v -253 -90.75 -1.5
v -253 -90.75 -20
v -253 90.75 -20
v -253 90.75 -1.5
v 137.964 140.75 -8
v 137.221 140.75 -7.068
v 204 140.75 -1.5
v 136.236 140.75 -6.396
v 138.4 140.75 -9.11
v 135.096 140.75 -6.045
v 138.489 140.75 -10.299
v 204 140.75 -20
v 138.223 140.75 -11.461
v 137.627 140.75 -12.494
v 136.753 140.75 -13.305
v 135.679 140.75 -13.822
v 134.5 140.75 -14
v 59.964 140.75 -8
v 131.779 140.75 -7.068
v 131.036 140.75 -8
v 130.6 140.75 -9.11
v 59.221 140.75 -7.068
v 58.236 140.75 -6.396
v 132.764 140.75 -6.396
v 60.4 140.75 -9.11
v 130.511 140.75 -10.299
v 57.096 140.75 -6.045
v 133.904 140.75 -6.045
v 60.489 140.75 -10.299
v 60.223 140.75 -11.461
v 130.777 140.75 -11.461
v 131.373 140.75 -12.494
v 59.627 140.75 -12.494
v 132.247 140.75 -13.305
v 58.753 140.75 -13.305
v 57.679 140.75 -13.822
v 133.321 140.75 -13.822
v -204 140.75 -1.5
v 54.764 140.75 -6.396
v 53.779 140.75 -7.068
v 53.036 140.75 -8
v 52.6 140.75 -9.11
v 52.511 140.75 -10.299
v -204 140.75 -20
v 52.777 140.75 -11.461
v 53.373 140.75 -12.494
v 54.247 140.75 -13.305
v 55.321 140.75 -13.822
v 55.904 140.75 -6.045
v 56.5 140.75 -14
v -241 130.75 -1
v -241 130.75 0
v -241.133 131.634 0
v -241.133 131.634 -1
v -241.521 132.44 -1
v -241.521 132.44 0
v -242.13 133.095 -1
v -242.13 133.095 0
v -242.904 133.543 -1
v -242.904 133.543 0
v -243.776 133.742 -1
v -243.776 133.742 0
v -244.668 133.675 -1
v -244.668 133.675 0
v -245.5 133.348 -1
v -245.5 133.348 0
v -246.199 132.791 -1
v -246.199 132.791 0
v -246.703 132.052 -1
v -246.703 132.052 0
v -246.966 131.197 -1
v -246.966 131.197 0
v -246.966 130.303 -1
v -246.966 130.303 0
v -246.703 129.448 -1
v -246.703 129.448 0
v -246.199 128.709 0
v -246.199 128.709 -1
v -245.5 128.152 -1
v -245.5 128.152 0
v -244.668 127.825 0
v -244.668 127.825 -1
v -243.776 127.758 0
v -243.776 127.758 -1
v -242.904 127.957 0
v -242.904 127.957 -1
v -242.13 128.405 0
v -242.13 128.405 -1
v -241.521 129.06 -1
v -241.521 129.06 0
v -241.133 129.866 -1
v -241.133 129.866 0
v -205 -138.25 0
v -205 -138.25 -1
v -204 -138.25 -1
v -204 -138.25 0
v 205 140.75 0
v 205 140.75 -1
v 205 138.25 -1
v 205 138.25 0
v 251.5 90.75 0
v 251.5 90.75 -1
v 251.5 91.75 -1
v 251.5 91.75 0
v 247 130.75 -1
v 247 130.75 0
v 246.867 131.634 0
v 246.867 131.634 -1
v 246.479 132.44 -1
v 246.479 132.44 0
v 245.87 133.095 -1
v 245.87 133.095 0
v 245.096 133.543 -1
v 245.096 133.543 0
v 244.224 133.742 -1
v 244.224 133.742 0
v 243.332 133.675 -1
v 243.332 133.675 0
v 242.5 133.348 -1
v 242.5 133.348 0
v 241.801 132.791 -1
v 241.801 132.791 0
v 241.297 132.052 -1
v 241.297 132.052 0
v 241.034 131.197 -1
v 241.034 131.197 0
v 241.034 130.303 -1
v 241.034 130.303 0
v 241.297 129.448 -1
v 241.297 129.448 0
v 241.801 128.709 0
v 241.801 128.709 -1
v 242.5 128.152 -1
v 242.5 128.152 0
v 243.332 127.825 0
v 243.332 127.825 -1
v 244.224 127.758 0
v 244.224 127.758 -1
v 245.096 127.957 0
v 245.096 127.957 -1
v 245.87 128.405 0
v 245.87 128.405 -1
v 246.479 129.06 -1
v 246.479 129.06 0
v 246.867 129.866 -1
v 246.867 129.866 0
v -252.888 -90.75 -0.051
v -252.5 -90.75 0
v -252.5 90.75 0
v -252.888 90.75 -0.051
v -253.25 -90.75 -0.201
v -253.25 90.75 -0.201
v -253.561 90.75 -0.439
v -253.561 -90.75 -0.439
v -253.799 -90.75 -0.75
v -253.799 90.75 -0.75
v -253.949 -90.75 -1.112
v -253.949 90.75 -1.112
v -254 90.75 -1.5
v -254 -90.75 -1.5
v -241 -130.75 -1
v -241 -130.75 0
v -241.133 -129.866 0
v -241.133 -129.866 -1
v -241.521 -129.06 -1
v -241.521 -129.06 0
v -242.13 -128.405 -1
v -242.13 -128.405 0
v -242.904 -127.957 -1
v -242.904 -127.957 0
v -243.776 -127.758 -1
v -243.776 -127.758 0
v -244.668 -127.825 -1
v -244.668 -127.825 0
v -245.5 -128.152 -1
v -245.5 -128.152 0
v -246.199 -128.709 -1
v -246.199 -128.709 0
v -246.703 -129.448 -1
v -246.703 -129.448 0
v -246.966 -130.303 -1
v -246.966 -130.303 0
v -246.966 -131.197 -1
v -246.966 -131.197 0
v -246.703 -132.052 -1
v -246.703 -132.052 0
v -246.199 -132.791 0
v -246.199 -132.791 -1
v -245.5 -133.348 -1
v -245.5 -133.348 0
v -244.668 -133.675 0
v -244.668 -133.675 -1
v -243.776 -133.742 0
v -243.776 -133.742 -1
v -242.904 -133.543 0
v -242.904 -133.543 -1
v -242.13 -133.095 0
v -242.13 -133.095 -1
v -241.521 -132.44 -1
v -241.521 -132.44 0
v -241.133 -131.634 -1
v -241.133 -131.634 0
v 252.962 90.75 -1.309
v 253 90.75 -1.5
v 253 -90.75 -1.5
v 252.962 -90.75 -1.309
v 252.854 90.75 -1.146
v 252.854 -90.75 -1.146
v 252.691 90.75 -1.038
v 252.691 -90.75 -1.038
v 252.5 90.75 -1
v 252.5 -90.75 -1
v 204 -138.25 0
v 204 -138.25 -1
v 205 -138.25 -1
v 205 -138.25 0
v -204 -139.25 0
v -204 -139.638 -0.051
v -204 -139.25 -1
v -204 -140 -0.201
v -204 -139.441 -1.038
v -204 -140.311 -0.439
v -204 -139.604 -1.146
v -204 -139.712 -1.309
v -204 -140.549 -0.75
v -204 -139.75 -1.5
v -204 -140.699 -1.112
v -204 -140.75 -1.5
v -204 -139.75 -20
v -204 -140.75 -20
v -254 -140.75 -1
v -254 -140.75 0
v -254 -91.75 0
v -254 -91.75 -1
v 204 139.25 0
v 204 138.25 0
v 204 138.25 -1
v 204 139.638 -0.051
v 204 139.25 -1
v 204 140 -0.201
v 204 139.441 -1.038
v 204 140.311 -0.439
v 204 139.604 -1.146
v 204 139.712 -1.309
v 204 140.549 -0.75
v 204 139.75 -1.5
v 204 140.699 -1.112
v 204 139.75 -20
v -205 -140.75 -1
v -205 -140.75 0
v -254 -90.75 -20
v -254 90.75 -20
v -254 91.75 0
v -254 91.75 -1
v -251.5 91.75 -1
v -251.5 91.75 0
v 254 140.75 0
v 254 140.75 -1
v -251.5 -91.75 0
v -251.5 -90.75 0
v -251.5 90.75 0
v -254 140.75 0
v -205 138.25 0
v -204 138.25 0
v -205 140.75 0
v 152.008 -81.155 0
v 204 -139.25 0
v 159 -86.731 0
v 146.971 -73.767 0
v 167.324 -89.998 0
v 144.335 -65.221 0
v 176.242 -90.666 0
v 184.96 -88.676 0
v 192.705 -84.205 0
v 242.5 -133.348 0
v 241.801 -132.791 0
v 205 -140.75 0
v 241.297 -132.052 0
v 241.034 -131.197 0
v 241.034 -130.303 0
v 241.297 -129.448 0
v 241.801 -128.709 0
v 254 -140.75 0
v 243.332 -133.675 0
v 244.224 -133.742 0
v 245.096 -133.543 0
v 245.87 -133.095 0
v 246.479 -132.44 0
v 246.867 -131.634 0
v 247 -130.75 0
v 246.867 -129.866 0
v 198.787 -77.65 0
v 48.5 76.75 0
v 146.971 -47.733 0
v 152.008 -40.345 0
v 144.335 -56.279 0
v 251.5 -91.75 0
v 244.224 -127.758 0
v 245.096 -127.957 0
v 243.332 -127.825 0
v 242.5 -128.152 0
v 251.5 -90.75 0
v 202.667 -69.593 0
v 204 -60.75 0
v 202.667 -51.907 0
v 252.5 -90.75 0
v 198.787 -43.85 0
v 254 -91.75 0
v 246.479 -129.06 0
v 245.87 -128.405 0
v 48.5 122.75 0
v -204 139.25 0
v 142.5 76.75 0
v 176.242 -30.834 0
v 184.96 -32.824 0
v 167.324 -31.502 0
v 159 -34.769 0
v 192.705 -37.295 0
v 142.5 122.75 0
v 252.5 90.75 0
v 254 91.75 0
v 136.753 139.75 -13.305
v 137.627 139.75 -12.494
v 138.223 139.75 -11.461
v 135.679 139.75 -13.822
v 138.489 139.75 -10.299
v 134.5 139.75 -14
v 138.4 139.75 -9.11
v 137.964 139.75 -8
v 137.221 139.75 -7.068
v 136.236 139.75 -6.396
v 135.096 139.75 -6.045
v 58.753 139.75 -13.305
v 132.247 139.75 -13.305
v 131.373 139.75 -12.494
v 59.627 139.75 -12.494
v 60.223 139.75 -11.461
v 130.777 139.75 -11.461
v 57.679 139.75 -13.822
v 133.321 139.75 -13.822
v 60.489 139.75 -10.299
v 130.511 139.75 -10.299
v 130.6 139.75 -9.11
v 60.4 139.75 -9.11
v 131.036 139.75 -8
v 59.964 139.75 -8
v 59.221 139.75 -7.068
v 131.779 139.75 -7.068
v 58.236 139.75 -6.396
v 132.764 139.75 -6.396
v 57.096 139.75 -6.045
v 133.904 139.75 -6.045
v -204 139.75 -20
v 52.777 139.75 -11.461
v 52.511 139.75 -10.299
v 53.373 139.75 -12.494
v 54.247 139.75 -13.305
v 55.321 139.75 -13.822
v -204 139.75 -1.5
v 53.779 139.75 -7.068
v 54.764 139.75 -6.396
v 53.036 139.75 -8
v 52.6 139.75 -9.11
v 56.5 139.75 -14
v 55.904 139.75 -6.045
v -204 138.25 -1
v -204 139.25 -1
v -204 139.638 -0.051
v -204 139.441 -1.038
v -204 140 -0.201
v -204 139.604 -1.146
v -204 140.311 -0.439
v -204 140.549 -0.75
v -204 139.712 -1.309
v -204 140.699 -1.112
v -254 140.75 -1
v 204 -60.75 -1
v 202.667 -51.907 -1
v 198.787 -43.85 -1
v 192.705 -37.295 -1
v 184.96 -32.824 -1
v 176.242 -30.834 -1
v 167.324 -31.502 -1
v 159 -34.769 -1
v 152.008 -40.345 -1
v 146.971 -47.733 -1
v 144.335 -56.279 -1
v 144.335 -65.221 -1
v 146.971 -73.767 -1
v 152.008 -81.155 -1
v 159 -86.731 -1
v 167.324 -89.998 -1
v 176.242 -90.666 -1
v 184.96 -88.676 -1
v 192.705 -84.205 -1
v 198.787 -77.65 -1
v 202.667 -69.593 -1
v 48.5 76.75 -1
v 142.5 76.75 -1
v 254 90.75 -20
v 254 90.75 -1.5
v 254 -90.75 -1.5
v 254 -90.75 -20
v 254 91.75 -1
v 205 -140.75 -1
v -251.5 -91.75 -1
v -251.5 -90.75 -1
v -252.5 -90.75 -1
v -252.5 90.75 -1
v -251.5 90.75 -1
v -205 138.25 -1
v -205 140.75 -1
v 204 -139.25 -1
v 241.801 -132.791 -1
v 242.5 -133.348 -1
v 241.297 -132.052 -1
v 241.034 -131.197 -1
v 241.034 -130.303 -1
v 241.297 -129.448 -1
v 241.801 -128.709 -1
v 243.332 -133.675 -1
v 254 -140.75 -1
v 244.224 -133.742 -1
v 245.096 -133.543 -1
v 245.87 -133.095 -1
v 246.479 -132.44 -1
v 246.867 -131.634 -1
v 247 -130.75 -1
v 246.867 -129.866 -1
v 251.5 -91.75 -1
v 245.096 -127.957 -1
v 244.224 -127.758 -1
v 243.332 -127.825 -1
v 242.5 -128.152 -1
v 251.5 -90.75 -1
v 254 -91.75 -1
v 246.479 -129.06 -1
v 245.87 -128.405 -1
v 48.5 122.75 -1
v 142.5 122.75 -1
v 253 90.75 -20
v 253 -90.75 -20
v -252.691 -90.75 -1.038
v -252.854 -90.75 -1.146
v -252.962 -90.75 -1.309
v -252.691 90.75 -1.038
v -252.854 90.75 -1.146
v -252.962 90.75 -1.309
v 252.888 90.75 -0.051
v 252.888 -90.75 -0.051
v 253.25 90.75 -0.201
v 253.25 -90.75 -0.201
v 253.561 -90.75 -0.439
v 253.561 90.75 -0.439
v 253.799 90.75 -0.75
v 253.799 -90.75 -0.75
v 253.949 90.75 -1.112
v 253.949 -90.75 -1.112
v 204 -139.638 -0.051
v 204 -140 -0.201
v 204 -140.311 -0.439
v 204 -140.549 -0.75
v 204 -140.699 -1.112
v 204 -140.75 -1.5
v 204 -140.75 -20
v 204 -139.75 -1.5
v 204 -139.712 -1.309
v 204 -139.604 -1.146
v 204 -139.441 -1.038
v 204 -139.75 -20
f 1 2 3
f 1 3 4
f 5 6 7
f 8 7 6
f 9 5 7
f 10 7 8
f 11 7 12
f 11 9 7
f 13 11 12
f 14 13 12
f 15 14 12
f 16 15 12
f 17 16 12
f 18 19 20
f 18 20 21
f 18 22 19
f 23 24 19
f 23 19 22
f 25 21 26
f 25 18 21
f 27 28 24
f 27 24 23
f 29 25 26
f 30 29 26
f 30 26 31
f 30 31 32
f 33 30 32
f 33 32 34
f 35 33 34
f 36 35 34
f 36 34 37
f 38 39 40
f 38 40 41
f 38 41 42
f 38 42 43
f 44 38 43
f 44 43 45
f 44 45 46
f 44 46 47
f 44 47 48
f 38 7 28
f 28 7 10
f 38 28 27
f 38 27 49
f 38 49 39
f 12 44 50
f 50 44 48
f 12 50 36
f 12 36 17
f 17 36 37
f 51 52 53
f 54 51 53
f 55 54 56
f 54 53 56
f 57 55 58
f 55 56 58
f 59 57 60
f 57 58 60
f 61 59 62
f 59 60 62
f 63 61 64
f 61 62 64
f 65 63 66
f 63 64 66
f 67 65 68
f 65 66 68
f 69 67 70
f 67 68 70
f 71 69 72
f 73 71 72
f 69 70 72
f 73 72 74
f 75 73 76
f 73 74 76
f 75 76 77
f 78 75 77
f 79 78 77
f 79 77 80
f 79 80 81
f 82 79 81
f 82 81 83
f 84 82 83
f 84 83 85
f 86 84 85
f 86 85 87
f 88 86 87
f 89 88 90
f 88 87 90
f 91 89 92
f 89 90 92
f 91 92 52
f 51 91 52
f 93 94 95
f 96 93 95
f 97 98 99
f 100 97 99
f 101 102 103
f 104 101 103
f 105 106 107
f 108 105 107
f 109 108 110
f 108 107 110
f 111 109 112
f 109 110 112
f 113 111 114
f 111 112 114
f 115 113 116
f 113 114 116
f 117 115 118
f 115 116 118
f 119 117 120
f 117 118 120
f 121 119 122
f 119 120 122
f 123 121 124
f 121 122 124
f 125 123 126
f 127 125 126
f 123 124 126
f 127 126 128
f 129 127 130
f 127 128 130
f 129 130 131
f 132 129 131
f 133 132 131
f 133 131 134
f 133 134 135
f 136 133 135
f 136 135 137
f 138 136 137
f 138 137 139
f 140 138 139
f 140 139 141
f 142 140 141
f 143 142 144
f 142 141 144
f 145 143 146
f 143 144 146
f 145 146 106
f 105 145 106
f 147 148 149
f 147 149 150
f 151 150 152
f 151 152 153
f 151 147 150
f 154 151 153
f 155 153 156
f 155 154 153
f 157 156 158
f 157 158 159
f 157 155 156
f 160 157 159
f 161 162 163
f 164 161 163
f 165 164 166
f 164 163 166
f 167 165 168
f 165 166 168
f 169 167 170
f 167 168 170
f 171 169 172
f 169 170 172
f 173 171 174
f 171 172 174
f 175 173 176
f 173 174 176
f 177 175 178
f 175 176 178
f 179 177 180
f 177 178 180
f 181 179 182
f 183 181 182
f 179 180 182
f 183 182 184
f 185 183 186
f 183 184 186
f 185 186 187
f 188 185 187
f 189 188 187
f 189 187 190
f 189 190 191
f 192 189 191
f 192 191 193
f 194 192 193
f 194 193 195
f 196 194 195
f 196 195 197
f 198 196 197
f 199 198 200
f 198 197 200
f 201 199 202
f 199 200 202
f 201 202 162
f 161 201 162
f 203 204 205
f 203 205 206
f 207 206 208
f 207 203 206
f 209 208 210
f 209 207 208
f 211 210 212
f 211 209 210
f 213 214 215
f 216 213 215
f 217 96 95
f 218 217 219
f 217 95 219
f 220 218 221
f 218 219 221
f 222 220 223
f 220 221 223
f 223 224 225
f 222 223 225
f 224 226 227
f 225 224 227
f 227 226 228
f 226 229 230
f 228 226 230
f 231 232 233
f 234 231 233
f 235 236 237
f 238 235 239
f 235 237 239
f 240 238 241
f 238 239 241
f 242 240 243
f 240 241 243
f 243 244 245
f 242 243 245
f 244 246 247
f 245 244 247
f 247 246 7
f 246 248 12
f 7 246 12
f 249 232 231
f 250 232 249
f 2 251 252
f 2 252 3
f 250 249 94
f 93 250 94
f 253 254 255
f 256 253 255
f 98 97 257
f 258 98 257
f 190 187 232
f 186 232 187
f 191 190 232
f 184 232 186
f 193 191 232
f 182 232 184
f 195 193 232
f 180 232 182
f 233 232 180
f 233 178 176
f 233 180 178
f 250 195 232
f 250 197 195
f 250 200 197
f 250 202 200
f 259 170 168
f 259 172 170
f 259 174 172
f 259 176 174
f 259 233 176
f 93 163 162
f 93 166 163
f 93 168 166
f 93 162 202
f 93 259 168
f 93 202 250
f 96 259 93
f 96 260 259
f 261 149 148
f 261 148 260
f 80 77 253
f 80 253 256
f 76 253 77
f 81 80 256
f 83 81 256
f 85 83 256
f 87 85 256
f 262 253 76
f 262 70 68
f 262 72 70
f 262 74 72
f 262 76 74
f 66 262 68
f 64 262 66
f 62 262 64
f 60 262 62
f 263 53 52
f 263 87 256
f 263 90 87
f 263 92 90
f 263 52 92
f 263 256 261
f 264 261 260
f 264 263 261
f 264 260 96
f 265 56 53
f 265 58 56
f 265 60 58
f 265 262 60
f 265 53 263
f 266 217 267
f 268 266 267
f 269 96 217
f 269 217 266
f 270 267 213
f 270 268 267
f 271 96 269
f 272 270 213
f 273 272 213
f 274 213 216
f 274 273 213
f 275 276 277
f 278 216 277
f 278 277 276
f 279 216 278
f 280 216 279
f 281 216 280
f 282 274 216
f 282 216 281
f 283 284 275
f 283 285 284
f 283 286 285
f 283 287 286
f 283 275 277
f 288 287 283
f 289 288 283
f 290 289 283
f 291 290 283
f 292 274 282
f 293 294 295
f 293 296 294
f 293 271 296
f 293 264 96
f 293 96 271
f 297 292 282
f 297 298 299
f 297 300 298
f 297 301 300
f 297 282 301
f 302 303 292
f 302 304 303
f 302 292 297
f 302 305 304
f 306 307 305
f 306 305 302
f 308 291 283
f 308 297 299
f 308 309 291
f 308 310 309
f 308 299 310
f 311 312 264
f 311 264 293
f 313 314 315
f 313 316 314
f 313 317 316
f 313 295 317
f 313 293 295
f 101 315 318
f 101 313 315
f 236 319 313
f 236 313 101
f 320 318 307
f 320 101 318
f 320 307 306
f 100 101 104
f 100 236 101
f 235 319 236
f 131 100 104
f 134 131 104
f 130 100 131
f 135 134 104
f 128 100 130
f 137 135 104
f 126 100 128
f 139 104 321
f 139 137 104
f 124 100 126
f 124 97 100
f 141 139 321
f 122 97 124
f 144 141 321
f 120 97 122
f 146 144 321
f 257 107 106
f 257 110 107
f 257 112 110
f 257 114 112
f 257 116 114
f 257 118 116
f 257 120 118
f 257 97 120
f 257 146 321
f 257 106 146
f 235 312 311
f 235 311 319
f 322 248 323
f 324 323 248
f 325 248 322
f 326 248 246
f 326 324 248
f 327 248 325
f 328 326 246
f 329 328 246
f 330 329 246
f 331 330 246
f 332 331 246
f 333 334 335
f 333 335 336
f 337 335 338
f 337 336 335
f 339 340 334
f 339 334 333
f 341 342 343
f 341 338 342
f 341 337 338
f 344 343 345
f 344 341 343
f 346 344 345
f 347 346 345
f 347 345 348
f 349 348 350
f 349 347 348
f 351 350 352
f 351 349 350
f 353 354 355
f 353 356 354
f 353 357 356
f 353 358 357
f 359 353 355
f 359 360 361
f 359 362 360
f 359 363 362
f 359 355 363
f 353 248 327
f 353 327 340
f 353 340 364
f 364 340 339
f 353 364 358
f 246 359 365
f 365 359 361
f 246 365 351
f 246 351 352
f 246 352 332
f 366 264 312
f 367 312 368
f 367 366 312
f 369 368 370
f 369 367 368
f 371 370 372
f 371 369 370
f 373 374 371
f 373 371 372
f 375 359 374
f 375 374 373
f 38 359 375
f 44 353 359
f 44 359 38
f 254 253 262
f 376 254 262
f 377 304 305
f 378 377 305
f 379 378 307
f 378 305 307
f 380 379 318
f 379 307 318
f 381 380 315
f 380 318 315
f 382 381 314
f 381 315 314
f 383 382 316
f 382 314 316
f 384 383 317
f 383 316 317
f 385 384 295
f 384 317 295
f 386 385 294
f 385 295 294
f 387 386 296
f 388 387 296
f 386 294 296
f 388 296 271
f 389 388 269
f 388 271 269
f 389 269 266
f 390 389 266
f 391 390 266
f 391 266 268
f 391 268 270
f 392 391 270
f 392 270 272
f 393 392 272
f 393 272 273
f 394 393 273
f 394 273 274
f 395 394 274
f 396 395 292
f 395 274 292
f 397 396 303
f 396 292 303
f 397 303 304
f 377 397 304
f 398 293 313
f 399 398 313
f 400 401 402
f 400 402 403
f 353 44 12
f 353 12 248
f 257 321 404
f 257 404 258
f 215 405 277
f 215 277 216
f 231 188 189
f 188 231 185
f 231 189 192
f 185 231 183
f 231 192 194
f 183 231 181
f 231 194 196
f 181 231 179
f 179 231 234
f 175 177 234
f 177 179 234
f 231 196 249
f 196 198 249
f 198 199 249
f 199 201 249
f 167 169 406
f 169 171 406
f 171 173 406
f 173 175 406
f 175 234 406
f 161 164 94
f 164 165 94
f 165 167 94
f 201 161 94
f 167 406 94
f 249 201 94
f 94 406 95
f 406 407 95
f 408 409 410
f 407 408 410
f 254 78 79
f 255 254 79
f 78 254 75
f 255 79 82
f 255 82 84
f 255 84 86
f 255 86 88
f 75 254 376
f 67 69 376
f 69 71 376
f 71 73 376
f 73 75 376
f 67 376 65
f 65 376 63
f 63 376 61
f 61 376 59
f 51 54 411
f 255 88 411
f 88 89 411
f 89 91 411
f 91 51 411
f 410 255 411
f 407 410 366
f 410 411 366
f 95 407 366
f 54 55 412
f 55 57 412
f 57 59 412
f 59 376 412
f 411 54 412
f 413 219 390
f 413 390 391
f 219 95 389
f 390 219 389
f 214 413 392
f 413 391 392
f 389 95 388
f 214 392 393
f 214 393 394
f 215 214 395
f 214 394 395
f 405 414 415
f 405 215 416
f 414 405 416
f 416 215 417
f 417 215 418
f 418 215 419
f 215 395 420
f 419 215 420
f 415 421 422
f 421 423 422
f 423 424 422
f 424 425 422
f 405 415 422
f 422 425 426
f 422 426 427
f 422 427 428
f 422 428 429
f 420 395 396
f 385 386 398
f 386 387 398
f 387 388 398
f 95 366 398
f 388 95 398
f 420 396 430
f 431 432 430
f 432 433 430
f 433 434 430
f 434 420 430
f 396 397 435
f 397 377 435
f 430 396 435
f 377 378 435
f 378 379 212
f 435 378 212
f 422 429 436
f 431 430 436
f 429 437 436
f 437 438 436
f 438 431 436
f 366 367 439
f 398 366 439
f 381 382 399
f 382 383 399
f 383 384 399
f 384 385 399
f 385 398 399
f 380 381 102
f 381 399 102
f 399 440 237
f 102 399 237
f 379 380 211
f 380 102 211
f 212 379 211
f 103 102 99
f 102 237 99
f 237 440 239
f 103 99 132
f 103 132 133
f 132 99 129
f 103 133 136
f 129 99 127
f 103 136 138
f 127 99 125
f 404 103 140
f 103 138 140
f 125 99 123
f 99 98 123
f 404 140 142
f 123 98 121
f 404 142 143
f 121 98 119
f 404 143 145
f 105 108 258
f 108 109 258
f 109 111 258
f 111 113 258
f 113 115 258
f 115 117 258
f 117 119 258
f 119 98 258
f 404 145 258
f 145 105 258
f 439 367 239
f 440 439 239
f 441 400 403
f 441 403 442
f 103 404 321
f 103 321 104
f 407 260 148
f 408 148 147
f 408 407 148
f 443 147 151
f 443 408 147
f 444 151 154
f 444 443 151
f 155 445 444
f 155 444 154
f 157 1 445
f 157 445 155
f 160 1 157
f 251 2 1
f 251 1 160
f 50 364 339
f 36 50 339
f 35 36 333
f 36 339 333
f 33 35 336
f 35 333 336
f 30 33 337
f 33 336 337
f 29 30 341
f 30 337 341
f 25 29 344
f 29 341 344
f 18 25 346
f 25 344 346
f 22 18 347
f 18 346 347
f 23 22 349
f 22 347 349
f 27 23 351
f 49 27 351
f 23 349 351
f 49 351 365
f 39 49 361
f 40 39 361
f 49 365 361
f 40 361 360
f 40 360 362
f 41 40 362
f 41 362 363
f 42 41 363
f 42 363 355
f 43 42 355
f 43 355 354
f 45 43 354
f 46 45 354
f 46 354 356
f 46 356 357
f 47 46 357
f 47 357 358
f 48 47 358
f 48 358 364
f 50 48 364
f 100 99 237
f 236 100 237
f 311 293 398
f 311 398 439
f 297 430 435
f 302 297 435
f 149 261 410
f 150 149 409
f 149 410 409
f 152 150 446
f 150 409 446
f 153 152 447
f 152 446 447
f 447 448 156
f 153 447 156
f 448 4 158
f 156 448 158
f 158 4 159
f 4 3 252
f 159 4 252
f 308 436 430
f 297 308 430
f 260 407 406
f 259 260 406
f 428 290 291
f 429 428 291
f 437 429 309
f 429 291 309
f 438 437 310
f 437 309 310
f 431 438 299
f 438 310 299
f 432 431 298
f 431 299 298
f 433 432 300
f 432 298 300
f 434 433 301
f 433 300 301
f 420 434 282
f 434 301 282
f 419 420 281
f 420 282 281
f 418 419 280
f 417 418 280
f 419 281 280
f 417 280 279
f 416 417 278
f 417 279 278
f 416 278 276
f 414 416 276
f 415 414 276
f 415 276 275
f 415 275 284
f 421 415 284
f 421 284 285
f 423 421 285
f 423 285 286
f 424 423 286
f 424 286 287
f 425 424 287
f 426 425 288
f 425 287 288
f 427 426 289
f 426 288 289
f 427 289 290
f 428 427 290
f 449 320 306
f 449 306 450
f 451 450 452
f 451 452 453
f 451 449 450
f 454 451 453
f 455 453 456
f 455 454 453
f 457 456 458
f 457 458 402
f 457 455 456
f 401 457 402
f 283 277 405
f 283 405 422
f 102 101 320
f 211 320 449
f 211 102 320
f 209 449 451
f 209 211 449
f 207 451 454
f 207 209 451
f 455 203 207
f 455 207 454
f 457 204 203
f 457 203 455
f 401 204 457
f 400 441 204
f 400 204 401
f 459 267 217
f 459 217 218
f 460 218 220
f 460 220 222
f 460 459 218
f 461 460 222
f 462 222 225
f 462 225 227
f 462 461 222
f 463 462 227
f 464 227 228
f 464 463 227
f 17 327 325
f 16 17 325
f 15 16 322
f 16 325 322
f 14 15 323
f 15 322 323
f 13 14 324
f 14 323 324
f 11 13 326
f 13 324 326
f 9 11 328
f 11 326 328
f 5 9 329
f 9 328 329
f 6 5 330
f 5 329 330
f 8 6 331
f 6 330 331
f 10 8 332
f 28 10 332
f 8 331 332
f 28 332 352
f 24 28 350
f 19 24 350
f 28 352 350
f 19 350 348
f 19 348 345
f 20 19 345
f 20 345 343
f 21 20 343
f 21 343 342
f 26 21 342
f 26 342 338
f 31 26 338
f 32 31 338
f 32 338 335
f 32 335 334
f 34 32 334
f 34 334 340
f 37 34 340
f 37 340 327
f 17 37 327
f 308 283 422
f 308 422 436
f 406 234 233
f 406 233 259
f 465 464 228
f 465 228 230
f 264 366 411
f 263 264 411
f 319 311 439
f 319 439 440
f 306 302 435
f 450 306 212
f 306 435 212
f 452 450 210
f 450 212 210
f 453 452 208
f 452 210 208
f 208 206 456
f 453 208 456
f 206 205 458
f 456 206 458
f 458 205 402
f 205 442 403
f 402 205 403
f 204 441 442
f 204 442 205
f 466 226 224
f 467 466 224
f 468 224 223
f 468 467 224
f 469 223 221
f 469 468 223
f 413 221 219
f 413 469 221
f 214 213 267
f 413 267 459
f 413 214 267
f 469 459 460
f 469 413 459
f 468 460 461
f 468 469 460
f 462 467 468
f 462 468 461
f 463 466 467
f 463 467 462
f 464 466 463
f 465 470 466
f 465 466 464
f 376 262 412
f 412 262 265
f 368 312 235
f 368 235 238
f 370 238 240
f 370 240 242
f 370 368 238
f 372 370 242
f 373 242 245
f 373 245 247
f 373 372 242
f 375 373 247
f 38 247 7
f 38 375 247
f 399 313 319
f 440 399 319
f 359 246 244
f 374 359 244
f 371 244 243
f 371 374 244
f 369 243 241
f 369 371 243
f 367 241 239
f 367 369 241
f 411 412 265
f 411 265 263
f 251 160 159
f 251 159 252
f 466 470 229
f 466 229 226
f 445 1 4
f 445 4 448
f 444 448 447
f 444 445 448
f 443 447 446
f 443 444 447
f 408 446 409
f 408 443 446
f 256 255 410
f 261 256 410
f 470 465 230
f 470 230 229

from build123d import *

# Parameters (mm, degrees)
SKETCH_1_W                        = 508
SKETCH_1_H                        = 281.5
SKETCH_1_R                        = 3
SKETCH_1_R_2                      = 30
SKETCH_1_W_2                      = 94
SKETCH_1_H_2                      = 46
SM_BASE_FLANGE_1_DEPTH            = 1
SM_EDGE_FLANGE_1_STRIP_W          = 5
SM_EDGE_FLANGE_1_STRIP_H          = 1
SM_EDGE_FLANGE_1_STRIP_CUT_DEPTH  = 408
SM_EDGE_FLANGE_1_RELIEF_W         = 6
SM_EDGE_FLANGE_1_RELIEF_H         = 1
SM_EDGE_FLANGE_1_RELIEF_CUT_DEPTH = 1
SM_EDGE_FLANGE_1_DEPTH            = 408
SM_EDGE_FLANGE_2_STRIP_W          = 5
SM_EDGE_FLANGE_2_STRIP_H          = 1
SM_EDGE_FLANGE_2_STRIP_CUT_DEPTH  = 181.5
SM_EDGE_FLANGE_2_RELIEF_W         = 6
SM_EDGE_FLANGE_2_RELIEF_H         = 1
SM_EDGE_FLANGE_2_RELIEF_CUT_DEPTH = 1
SM_EDGE_FLANGE_2_DEPTH            = 181.5
SM_EDGE_FLANGE_3_STRIP_W          = 5
SM_EDGE_FLANGE_3_STRIP_H          = 1
SM_EDGE_FLANGE_3_STRIP_CUT_DEPTH  = 408
SM_EDGE_FLANGE_3_RELIEF_W         = 6
SM_EDGE_FLANGE_3_RELIEF_H         = 1
SM_EDGE_FLANGE_3_RELIEF_CUT_DEPTH = 1
SM_EDGE_FLANGE_3_DEPTH            = 408
SM_EDGE_FLANGE_4_STRIP_W          = 5
SM_EDGE_FLANGE_4_STRIP_H          = 1
SM_EDGE_FLANGE_4_STRIP_CUT_DEPTH  = 181.5
SM_EDGE_FLANGE_4_RELIEF_W         = 6
SM_EDGE_FLANGE_4_RELIEF_H         = 1
SM_EDGE_FLANGE_4_RELIEF_CUT_DEPTH = 1
SM_EDGE_FLANGE_4_DEPTH            = 181.5
SKETCH_32_R                       = 4
CUT_EXTRUDE_1_DEPTH               = 379.940958462


# Sheet-metal steps are written as plain solids
with BuildPart() as part:
    # 基体-法兰1: sheet metal written as solids
    # Sketch 1 → 基体-法兰1 (new body)
    with BuildSketch(Plane.XY):
        Rectangle(SKETCH_1_W, SKETCH_1_H)
        with Locations((-244, 130.75)):
            Circle(SKETCH_1_R, mode=Mode.SUBTRACT)
        with Locations((-244, -130.75)):
            Circle(SKETCH_1_R, mode=Mode.SUBTRACT)
        with Locations((244, 130.75)):
            Circle(SKETCH_1_R, mode=Mode.SUBTRACT)
        with Locations((244, -130.75)):
            Circle(SKETCH_1_R, mode=Mode.SUBTRACT)
        with Locations((174, -60.75)):
            Circle(SKETCH_1_R_2, mode=Mode.SUBTRACT)
        with Locations((95.5, 99.75)):
            Rectangle(SKETCH_1_W_2, SKETCH_1_H_2, mode=Mode.SUBTRACT)
    extrude(amount=-SM_BASE_FLANGE_1_DEPTH)

    # 边线-法兰1: sheet metal written as solids
    # 边线-法兰1 strip (on a plane across the edge) → 边线-法兰1 strip cut (cut)
    with BuildSketch(Plane(origin=(-204, 140.75, -1), x_dir=(0, -1, 0), z_dir=(1, 0, 0))):
        with Locations((-1, -0.5)):
            Rectangle(SM_EDGE_FLANGE_1_STRIP_W, SM_EDGE_FLANGE_1_STRIP_H)
    extrude(amount=SM_EDGE_FLANGE_1_STRIP_CUT_DEPTH, mode=Mode.SUBTRACT)

    # 边线-法兰1 relief (on the sheet) → 边线-法兰1 relief cut (cut)
    with BuildSketch(Plane(origin=(-204, 139.25, -1), x_dir=(0, -1, 0), z_dir=(0, 0, -1))):
        with Locations((-2, 0.5)):
            Rectangle(SM_EDGE_FLANGE_1_RELIEF_W, SM_EDGE_FLANGE_1_RELIEF_H)
        with Locations((-2, -408.5)):
            Rectangle(SM_EDGE_FLANGE_1_RELIEF_W, SM_EDGE_FLANGE_1_RELIEF_H)
    extrude(amount=-SM_EDGE_FLANGE_1_RELIEF_CUT_DEPTH, mode=Mode.SUBTRACT)

    # 边线-法兰1 section (on a plane across the edge) → 边线-法兰1 (add)
    with BuildSketch(Plane(origin=(-204, 140.75, -1), x_dir=(0, -1, 0), z_dir=(1, 0, 0))):
        with BuildLine():
            Line((0, 0.5), (0, 19))
            Line((0, 19), (1, 19))
            Line((1, 19), (1, 0.5))
            ThreePointArc((1, 0.5), (1.146446609, 0.146446609), (1.5, 0))
            Line((1.5, 0), (1.5, -1))
            ThreePointArc((1.5, -1), (0.439339828, -0.560660172), (0, 0.5))
        make_face()
    extrude(amount=SM_EDGE_FLANGE_1_DEPTH)

    # 边线-法兰2: sheet metal written as solids
    # 边线-法兰2 strip (on a plane across the edge) → 边线-法兰2 strip cut (cut)
    with BuildSketch(Plane(origin=(-254, -90.75, -1), x_dir=(1, 0, 0), z_dir=(0, 1, 0))):
        with Locations((-1, -0.5)):
            Rectangle(SM_EDGE_FLANGE_2_STRIP_W, SM_EDGE_FLANGE_2_STRIP_H)
    extrude(amount=SM_EDGE_FLANGE_2_STRIP_CUT_DEPTH, mode=Mode.SUBTRACT)

    # 边线-法兰2 relief (on the sheet) → 边线-法兰2 relief cut (cut)
    with BuildSketch(Plane(origin=(-252.5, -90.75, -1), x_dir=(1, 0, 0), z_dir=(0, 0, -1))):
        with Locations((-2, 0.5)):
            Rectangle(SM_EDGE_FLANGE_2_RELIEF_W, SM_EDGE_FLANGE_2_RELIEF_H)
        with Locations((-2, -182)):
            Rectangle(SM_EDGE_FLANGE_2_RELIEF_W, SM_EDGE_FLANGE_2_RELIEF_H)
    extrude(amount=-SM_EDGE_FLANGE_2_RELIEF_CUT_DEPTH, mode=Mode.SUBTRACT)

    # 边线-法兰2 section (on a plane across the edge) → 边线-法兰2 (add)
    with BuildSketch(Plane(origin=(-254, -90.75, -1), x_dir=(1, 0, 0), z_dir=(0, 1, 0))):
        with BuildLine():
            Line((0, 0.5), (0, 19))
            Line((0, 19), (1, 19))
            Line((1, 19), (1, 0.5))
            ThreePointArc((1, 0.5), (1.146446609, 0.146446609), (1.5, 0))
            Line((1.5, 0), (1.5, -1))
            ThreePointArc((1.5, -1), (0.439339828, -0.560660172), (0, 0.5))
        make_face()
    extrude(amount=SM_EDGE_FLANGE_2_DEPTH)

    # 边线-法兰3: sheet metal written as solids
    # 边线-法兰3 strip (on a plane across the edge) → 边线-法兰3 strip cut (cut)
    with BuildSketch(Plane(origin=(204, -140.75, -1), x_dir=(0, 1, 0), z_dir=(-1, 0, 0))):
        with Locations((-1, -0.5)):
            Rectangle(SM_EDGE_FLANGE_3_STRIP_W, SM_EDGE_FLANGE_3_STRIP_H)
    extrude(amount=SM_EDGE_FLANGE_3_STRIP_CUT_DEPTH, mode=Mode.SUBTRACT)

    # 边线-法兰3 relief (on the sheet) → 边线-法兰3 relief cut (cut)
    with BuildSketch(Plane(origin=(204, -139.25, -1), x_dir=(0, 1, 0), z_dir=(0, 0, -1))):
        with Locations((-2, 0.5)):
            Rectangle(SM_EDGE_FLANGE_3_RELIEF_W, SM_EDGE_FLANGE_3_RELIEF_H)
        with Locations((-2, -408.5)):
            Rectangle(SM_EDGE_FLANGE_3_RELIEF_W, SM_EDGE_FLANGE_3_RELIEF_H)
    extrude(amount=-SM_EDGE_FLANGE_3_RELIEF_CUT_DEPTH, mode=Mode.SUBTRACT)

    # 边线-法兰3 section (on a plane across the edge) → 边线-法兰3 (add)
    with BuildSketch(Plane(origin=(204, -140.75, -1), x_dir=(0, 1, 0), z_dir=(-1, 0, 0))):
        with BuildLine():
            Line((0, 0.5), (0, 19))
            Line((0, 19), (1, 19))
            Line((1, 19), (1, 0.5))
            ThreePointArc((1, 0.5), (1.146446609, 0.146446609), (1.5, 0))
            Line((1.5, 0), (1.5, -1))
            ThreePointArc((1.5, -1), (0.439339828, -0.560660172), (0, 0.5))
        make_face()
    extrude(amount=SM_EDGE_FLANGE_3_DEPTH)

    # 边线-法兰4: sheet metal written as solids
    # 边线-法兰4 strip (on a plane across the edge) → 边线-法兰4 strip cut (cut)
    with BuildSketch(Plane(origin=(254, 90.75, -1), x_dir=(-1, 0, 0), z_dir=(0, -1, 0))):
        with Locations((-1, -0.5)):
            Rectangle(SM_EDGE_FLANGE_4_STRIP_W, SM_EDGE_FLANGE_4_STRIP_H)
    extrude(amount=SM_EDGE_FLANGE_4_STRIP_CUT_DEPTH, mode=Mode.SUBTRACT)

    # 边线-法兰4 relief (on the sheet) → 边线-法兰4 relief cut (cut)
    with BuildSketch(Plane(origin=(252.5, 90.75, -1), x_dir=(-1, 0, 0), z_dir=(0, 0, -1))):
        with Locations((-2, 0.5)):
            Rectangle(SM_EDGE_FLANGE_4_RELIEF_W, SM_EDGE_FLANGE_4_RELIEF_H)
        with Locations((-2, -182)):
            Rectangle(SM_EDGE_FLANGE_4_RELIEF_W, SM_EDGE_FLANGE_4_RELIEF_H)
    extrude(amount=-SM_EDGE_FLANGE_4_RELIEF_CUT_DEPTH, mode=Mode.SUBTRACT)

    # 边线-法兰4 section (on a plane across the edge) → 边线-法兰4 (add)
    with BuildSketch(Plane(origin=(254, 90.75, -1), x_dir=(-1, 0, 0), z_dir=(0, -1, 0))):
        with BuildLine():
            Line((0, 0.5), (0, 19))
            Line((0, 19), (1, 19))
            Line((1, 19), (1, 0.5))
            ThreePointArc((1, 0.5), (1.146446609, 0.146446609), (1.5, 0))
            Line((1.5, 0), (1.5, -1))
            ThreePointArc((1.5, -1), (0.439339828, -0.560660172), (0, 0.5))
        make_face()
    extrude(amount=SM_EDGE_FLANGE_4_DEPTH)

    # 草图32 → 切除-拉伸1 (cut, through all)
    with BuildSketch(Plane(origin=(0, 139.75, 0), x_dir=(-1, 0, 0), z_dir=(0, -1, 0))):
        with Locations(Location((-134.5, 10, 0), (0, 0, 90))):
            Circle(SKETCH_32_R)
        with Locations(Location((-56.5, 10, 0), (0, 0, 90))):
            Circle(SKETCH_32_R)
    extrude(amount=-CUT_EXTRUDE_1_DEPTH, mode=Mode.SUBTRACT)


solid = part.part
